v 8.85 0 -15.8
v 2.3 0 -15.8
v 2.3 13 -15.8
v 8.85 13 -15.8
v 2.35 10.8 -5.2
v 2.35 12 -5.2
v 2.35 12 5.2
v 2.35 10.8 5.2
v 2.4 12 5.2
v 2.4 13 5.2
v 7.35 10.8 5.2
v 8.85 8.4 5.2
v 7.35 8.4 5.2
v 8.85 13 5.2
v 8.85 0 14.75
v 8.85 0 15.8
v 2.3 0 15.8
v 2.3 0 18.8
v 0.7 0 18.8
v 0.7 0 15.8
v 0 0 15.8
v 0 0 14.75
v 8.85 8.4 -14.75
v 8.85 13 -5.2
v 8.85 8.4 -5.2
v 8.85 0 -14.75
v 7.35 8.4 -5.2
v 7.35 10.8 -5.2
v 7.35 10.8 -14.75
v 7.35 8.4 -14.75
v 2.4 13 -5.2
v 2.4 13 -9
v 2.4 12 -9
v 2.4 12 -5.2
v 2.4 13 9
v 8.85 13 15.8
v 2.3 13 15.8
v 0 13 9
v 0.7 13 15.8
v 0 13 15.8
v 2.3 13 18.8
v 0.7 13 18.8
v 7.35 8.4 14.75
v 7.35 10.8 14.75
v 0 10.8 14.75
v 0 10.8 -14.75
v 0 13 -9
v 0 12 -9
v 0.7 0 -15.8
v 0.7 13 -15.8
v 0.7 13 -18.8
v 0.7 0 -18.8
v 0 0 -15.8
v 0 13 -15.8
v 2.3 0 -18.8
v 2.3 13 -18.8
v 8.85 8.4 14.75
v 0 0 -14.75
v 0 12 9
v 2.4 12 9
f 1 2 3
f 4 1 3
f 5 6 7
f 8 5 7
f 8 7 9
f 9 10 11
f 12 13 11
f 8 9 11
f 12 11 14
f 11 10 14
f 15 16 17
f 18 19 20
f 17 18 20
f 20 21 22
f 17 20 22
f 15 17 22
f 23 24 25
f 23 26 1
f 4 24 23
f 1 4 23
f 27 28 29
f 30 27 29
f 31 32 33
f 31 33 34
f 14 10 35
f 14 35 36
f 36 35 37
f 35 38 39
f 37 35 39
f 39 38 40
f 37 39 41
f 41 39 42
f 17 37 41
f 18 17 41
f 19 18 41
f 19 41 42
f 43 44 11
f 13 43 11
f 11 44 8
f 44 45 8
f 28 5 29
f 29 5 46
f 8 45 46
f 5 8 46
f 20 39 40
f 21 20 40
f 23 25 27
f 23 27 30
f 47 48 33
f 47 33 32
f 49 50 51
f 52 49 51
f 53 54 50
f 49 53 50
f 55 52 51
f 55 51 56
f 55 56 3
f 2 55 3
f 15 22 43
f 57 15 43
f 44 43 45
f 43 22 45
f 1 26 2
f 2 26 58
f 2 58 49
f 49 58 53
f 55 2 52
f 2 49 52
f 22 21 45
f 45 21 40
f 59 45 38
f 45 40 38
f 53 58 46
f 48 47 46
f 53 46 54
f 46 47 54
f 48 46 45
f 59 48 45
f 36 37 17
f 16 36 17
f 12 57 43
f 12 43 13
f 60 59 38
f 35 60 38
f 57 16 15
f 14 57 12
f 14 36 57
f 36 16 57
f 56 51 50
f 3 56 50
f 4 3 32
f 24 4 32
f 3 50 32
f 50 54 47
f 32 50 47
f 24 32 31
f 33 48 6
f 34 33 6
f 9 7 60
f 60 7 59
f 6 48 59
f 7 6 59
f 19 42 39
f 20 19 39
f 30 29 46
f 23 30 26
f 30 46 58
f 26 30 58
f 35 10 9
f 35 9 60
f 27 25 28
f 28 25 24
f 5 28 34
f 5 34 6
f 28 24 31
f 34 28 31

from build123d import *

# Parameters (mm, degrees)
SKETCH1_W           = 38
SKETCH1_H           = 13
BOSS_EXTRUDE1_DEPTH = 3
CUT_EXTRUDE1_DEPTH  = 24.216373532
SKETCH3_W           = 29.5
SKETCH3_H           = 10.8
CUT_EXTRUDE2_DEPTH  = 3
BOSS_EXTRUDE2_DEPTH = 5.85
SKETCH5_W           = 9.75
SKETCH5_H           = 2.4
BOSS_EXTRUDE3_DEPTH = 1.5
CUT_EXTRUDE3_DEPTH  = 10
SKETCH7_W           = 18
SKETCH7_H           = 1
CUT_EXTRUDE4_DEPTH  = 2.4


with BuildPart() as part:
    # Sketch1 → Boss-Extrude1 (new body)
    with BuildSketch(Plane(origin=(0, 0, 0), x_dir=(0, 0, -1), z_dir=(1, 0, 0))):
        with Locations((0, 6.5)):
            Rectangle(SKETCH1_W, SKETCH1_H)
    extrude(amount=BOSS_EXTRUDE1_DEPTH)

    # Sketch2 → Cut-Extrude1 (cut, through all)
    with BuildSketch(Plane(origin=(0, 13, 0), x_dir=(1, 0, 0), z_dir=(0, 1, 0))):
        Polygon((0.7, -18.8), (0.7, -15.8), (0, -15.8), (0, -19), (3, -19), (3, -15.8), (2.3, -15.8), (2.3, -18.8), align=None)
        Polygon((2.3, 18.8), (2.3, 15.8), (3, 15.8), (3, 19), (0, 19), (0, 15.8), (0.7, 15.8), (0.7, 18.8), align=None)
    extrude(amount=-CUT_EXTRUDE1_DEPTH, mode=Mode.SUBTRACT)

    # Sketch3 → Cut-Extrude2 (cut)
    with BuildSketch(Plane(origin=(3, 0, 0), x_dir=(0, 0, -1), z_dir=(1, 0, 0))):
        with Locations((0, 5.4)):
            Rectangle(SKETCH3_W, SKETCH3_H)
    extrude(amount=-CUT_EXTRUDE2_DEPTH, mode=Mode.SUBTRACT)

    # Sketch4 → Boss-Extrude2 (add)
    with BuildSketch(Plane(origin=(3, 0, 0), x_dir=(0, 0, -1), z_dir=(1, 0, 0))):
        Polygon((-15.8, 13), (-15.8, 0), (-14.75, 0), (-14.75, 10.8), (14.75, 10.8), (14.75, 0), (15.8, 0), (15.8, 13), align=None)
    extrude(amount=BOSS_EXTRUDE2_DEPTH)

    # Sketch5 → Boss-Extrude3 (add)
    with BuildSketch(Plane(origin=(8.85, 0, 0), x_dir=(0, 0, -1), z_dir=(1, 0, 0))):
        with Locations((-9.875, 9.6)):
            Rectangle(SKETCH5_W, SKETCH5_H)
        with Locations((9.875, 9.6)):
            Rectangle(SKETCH5_W, SKETCH5_H)
    extrude(amount=-BOSS_EXTRUDE3_DEPTH)

    # Sketch6 → Cut-Extrude3 (cut)
    with BuildSketch(Plane(origin=(0, 13, 0), x_dir=(1, 0, 0), z_dir=(0, 1, 0))):
        Polygon((8.85, 5.2), (2.35, 5.2), (2.35, 0), (2.35, -5.2), (8.85, -5.2), align=None)
    extrude(amount=-CUT_EXTRUDE3_DEPTH, mode=Mode.SUBTRACT)

    # Sketch7 → Cut-Extrude4 (cut)
    with BuildSketch(Plane.ZY):
        with Locations((0, 12.5)):
            Rectangle(SKETCH7_W, SKETCH7_H)
    extrude(amount=-CUT_EXTRUDE4_DEPTH, mode=Mode.SUBTRACT)


solid = part.part
